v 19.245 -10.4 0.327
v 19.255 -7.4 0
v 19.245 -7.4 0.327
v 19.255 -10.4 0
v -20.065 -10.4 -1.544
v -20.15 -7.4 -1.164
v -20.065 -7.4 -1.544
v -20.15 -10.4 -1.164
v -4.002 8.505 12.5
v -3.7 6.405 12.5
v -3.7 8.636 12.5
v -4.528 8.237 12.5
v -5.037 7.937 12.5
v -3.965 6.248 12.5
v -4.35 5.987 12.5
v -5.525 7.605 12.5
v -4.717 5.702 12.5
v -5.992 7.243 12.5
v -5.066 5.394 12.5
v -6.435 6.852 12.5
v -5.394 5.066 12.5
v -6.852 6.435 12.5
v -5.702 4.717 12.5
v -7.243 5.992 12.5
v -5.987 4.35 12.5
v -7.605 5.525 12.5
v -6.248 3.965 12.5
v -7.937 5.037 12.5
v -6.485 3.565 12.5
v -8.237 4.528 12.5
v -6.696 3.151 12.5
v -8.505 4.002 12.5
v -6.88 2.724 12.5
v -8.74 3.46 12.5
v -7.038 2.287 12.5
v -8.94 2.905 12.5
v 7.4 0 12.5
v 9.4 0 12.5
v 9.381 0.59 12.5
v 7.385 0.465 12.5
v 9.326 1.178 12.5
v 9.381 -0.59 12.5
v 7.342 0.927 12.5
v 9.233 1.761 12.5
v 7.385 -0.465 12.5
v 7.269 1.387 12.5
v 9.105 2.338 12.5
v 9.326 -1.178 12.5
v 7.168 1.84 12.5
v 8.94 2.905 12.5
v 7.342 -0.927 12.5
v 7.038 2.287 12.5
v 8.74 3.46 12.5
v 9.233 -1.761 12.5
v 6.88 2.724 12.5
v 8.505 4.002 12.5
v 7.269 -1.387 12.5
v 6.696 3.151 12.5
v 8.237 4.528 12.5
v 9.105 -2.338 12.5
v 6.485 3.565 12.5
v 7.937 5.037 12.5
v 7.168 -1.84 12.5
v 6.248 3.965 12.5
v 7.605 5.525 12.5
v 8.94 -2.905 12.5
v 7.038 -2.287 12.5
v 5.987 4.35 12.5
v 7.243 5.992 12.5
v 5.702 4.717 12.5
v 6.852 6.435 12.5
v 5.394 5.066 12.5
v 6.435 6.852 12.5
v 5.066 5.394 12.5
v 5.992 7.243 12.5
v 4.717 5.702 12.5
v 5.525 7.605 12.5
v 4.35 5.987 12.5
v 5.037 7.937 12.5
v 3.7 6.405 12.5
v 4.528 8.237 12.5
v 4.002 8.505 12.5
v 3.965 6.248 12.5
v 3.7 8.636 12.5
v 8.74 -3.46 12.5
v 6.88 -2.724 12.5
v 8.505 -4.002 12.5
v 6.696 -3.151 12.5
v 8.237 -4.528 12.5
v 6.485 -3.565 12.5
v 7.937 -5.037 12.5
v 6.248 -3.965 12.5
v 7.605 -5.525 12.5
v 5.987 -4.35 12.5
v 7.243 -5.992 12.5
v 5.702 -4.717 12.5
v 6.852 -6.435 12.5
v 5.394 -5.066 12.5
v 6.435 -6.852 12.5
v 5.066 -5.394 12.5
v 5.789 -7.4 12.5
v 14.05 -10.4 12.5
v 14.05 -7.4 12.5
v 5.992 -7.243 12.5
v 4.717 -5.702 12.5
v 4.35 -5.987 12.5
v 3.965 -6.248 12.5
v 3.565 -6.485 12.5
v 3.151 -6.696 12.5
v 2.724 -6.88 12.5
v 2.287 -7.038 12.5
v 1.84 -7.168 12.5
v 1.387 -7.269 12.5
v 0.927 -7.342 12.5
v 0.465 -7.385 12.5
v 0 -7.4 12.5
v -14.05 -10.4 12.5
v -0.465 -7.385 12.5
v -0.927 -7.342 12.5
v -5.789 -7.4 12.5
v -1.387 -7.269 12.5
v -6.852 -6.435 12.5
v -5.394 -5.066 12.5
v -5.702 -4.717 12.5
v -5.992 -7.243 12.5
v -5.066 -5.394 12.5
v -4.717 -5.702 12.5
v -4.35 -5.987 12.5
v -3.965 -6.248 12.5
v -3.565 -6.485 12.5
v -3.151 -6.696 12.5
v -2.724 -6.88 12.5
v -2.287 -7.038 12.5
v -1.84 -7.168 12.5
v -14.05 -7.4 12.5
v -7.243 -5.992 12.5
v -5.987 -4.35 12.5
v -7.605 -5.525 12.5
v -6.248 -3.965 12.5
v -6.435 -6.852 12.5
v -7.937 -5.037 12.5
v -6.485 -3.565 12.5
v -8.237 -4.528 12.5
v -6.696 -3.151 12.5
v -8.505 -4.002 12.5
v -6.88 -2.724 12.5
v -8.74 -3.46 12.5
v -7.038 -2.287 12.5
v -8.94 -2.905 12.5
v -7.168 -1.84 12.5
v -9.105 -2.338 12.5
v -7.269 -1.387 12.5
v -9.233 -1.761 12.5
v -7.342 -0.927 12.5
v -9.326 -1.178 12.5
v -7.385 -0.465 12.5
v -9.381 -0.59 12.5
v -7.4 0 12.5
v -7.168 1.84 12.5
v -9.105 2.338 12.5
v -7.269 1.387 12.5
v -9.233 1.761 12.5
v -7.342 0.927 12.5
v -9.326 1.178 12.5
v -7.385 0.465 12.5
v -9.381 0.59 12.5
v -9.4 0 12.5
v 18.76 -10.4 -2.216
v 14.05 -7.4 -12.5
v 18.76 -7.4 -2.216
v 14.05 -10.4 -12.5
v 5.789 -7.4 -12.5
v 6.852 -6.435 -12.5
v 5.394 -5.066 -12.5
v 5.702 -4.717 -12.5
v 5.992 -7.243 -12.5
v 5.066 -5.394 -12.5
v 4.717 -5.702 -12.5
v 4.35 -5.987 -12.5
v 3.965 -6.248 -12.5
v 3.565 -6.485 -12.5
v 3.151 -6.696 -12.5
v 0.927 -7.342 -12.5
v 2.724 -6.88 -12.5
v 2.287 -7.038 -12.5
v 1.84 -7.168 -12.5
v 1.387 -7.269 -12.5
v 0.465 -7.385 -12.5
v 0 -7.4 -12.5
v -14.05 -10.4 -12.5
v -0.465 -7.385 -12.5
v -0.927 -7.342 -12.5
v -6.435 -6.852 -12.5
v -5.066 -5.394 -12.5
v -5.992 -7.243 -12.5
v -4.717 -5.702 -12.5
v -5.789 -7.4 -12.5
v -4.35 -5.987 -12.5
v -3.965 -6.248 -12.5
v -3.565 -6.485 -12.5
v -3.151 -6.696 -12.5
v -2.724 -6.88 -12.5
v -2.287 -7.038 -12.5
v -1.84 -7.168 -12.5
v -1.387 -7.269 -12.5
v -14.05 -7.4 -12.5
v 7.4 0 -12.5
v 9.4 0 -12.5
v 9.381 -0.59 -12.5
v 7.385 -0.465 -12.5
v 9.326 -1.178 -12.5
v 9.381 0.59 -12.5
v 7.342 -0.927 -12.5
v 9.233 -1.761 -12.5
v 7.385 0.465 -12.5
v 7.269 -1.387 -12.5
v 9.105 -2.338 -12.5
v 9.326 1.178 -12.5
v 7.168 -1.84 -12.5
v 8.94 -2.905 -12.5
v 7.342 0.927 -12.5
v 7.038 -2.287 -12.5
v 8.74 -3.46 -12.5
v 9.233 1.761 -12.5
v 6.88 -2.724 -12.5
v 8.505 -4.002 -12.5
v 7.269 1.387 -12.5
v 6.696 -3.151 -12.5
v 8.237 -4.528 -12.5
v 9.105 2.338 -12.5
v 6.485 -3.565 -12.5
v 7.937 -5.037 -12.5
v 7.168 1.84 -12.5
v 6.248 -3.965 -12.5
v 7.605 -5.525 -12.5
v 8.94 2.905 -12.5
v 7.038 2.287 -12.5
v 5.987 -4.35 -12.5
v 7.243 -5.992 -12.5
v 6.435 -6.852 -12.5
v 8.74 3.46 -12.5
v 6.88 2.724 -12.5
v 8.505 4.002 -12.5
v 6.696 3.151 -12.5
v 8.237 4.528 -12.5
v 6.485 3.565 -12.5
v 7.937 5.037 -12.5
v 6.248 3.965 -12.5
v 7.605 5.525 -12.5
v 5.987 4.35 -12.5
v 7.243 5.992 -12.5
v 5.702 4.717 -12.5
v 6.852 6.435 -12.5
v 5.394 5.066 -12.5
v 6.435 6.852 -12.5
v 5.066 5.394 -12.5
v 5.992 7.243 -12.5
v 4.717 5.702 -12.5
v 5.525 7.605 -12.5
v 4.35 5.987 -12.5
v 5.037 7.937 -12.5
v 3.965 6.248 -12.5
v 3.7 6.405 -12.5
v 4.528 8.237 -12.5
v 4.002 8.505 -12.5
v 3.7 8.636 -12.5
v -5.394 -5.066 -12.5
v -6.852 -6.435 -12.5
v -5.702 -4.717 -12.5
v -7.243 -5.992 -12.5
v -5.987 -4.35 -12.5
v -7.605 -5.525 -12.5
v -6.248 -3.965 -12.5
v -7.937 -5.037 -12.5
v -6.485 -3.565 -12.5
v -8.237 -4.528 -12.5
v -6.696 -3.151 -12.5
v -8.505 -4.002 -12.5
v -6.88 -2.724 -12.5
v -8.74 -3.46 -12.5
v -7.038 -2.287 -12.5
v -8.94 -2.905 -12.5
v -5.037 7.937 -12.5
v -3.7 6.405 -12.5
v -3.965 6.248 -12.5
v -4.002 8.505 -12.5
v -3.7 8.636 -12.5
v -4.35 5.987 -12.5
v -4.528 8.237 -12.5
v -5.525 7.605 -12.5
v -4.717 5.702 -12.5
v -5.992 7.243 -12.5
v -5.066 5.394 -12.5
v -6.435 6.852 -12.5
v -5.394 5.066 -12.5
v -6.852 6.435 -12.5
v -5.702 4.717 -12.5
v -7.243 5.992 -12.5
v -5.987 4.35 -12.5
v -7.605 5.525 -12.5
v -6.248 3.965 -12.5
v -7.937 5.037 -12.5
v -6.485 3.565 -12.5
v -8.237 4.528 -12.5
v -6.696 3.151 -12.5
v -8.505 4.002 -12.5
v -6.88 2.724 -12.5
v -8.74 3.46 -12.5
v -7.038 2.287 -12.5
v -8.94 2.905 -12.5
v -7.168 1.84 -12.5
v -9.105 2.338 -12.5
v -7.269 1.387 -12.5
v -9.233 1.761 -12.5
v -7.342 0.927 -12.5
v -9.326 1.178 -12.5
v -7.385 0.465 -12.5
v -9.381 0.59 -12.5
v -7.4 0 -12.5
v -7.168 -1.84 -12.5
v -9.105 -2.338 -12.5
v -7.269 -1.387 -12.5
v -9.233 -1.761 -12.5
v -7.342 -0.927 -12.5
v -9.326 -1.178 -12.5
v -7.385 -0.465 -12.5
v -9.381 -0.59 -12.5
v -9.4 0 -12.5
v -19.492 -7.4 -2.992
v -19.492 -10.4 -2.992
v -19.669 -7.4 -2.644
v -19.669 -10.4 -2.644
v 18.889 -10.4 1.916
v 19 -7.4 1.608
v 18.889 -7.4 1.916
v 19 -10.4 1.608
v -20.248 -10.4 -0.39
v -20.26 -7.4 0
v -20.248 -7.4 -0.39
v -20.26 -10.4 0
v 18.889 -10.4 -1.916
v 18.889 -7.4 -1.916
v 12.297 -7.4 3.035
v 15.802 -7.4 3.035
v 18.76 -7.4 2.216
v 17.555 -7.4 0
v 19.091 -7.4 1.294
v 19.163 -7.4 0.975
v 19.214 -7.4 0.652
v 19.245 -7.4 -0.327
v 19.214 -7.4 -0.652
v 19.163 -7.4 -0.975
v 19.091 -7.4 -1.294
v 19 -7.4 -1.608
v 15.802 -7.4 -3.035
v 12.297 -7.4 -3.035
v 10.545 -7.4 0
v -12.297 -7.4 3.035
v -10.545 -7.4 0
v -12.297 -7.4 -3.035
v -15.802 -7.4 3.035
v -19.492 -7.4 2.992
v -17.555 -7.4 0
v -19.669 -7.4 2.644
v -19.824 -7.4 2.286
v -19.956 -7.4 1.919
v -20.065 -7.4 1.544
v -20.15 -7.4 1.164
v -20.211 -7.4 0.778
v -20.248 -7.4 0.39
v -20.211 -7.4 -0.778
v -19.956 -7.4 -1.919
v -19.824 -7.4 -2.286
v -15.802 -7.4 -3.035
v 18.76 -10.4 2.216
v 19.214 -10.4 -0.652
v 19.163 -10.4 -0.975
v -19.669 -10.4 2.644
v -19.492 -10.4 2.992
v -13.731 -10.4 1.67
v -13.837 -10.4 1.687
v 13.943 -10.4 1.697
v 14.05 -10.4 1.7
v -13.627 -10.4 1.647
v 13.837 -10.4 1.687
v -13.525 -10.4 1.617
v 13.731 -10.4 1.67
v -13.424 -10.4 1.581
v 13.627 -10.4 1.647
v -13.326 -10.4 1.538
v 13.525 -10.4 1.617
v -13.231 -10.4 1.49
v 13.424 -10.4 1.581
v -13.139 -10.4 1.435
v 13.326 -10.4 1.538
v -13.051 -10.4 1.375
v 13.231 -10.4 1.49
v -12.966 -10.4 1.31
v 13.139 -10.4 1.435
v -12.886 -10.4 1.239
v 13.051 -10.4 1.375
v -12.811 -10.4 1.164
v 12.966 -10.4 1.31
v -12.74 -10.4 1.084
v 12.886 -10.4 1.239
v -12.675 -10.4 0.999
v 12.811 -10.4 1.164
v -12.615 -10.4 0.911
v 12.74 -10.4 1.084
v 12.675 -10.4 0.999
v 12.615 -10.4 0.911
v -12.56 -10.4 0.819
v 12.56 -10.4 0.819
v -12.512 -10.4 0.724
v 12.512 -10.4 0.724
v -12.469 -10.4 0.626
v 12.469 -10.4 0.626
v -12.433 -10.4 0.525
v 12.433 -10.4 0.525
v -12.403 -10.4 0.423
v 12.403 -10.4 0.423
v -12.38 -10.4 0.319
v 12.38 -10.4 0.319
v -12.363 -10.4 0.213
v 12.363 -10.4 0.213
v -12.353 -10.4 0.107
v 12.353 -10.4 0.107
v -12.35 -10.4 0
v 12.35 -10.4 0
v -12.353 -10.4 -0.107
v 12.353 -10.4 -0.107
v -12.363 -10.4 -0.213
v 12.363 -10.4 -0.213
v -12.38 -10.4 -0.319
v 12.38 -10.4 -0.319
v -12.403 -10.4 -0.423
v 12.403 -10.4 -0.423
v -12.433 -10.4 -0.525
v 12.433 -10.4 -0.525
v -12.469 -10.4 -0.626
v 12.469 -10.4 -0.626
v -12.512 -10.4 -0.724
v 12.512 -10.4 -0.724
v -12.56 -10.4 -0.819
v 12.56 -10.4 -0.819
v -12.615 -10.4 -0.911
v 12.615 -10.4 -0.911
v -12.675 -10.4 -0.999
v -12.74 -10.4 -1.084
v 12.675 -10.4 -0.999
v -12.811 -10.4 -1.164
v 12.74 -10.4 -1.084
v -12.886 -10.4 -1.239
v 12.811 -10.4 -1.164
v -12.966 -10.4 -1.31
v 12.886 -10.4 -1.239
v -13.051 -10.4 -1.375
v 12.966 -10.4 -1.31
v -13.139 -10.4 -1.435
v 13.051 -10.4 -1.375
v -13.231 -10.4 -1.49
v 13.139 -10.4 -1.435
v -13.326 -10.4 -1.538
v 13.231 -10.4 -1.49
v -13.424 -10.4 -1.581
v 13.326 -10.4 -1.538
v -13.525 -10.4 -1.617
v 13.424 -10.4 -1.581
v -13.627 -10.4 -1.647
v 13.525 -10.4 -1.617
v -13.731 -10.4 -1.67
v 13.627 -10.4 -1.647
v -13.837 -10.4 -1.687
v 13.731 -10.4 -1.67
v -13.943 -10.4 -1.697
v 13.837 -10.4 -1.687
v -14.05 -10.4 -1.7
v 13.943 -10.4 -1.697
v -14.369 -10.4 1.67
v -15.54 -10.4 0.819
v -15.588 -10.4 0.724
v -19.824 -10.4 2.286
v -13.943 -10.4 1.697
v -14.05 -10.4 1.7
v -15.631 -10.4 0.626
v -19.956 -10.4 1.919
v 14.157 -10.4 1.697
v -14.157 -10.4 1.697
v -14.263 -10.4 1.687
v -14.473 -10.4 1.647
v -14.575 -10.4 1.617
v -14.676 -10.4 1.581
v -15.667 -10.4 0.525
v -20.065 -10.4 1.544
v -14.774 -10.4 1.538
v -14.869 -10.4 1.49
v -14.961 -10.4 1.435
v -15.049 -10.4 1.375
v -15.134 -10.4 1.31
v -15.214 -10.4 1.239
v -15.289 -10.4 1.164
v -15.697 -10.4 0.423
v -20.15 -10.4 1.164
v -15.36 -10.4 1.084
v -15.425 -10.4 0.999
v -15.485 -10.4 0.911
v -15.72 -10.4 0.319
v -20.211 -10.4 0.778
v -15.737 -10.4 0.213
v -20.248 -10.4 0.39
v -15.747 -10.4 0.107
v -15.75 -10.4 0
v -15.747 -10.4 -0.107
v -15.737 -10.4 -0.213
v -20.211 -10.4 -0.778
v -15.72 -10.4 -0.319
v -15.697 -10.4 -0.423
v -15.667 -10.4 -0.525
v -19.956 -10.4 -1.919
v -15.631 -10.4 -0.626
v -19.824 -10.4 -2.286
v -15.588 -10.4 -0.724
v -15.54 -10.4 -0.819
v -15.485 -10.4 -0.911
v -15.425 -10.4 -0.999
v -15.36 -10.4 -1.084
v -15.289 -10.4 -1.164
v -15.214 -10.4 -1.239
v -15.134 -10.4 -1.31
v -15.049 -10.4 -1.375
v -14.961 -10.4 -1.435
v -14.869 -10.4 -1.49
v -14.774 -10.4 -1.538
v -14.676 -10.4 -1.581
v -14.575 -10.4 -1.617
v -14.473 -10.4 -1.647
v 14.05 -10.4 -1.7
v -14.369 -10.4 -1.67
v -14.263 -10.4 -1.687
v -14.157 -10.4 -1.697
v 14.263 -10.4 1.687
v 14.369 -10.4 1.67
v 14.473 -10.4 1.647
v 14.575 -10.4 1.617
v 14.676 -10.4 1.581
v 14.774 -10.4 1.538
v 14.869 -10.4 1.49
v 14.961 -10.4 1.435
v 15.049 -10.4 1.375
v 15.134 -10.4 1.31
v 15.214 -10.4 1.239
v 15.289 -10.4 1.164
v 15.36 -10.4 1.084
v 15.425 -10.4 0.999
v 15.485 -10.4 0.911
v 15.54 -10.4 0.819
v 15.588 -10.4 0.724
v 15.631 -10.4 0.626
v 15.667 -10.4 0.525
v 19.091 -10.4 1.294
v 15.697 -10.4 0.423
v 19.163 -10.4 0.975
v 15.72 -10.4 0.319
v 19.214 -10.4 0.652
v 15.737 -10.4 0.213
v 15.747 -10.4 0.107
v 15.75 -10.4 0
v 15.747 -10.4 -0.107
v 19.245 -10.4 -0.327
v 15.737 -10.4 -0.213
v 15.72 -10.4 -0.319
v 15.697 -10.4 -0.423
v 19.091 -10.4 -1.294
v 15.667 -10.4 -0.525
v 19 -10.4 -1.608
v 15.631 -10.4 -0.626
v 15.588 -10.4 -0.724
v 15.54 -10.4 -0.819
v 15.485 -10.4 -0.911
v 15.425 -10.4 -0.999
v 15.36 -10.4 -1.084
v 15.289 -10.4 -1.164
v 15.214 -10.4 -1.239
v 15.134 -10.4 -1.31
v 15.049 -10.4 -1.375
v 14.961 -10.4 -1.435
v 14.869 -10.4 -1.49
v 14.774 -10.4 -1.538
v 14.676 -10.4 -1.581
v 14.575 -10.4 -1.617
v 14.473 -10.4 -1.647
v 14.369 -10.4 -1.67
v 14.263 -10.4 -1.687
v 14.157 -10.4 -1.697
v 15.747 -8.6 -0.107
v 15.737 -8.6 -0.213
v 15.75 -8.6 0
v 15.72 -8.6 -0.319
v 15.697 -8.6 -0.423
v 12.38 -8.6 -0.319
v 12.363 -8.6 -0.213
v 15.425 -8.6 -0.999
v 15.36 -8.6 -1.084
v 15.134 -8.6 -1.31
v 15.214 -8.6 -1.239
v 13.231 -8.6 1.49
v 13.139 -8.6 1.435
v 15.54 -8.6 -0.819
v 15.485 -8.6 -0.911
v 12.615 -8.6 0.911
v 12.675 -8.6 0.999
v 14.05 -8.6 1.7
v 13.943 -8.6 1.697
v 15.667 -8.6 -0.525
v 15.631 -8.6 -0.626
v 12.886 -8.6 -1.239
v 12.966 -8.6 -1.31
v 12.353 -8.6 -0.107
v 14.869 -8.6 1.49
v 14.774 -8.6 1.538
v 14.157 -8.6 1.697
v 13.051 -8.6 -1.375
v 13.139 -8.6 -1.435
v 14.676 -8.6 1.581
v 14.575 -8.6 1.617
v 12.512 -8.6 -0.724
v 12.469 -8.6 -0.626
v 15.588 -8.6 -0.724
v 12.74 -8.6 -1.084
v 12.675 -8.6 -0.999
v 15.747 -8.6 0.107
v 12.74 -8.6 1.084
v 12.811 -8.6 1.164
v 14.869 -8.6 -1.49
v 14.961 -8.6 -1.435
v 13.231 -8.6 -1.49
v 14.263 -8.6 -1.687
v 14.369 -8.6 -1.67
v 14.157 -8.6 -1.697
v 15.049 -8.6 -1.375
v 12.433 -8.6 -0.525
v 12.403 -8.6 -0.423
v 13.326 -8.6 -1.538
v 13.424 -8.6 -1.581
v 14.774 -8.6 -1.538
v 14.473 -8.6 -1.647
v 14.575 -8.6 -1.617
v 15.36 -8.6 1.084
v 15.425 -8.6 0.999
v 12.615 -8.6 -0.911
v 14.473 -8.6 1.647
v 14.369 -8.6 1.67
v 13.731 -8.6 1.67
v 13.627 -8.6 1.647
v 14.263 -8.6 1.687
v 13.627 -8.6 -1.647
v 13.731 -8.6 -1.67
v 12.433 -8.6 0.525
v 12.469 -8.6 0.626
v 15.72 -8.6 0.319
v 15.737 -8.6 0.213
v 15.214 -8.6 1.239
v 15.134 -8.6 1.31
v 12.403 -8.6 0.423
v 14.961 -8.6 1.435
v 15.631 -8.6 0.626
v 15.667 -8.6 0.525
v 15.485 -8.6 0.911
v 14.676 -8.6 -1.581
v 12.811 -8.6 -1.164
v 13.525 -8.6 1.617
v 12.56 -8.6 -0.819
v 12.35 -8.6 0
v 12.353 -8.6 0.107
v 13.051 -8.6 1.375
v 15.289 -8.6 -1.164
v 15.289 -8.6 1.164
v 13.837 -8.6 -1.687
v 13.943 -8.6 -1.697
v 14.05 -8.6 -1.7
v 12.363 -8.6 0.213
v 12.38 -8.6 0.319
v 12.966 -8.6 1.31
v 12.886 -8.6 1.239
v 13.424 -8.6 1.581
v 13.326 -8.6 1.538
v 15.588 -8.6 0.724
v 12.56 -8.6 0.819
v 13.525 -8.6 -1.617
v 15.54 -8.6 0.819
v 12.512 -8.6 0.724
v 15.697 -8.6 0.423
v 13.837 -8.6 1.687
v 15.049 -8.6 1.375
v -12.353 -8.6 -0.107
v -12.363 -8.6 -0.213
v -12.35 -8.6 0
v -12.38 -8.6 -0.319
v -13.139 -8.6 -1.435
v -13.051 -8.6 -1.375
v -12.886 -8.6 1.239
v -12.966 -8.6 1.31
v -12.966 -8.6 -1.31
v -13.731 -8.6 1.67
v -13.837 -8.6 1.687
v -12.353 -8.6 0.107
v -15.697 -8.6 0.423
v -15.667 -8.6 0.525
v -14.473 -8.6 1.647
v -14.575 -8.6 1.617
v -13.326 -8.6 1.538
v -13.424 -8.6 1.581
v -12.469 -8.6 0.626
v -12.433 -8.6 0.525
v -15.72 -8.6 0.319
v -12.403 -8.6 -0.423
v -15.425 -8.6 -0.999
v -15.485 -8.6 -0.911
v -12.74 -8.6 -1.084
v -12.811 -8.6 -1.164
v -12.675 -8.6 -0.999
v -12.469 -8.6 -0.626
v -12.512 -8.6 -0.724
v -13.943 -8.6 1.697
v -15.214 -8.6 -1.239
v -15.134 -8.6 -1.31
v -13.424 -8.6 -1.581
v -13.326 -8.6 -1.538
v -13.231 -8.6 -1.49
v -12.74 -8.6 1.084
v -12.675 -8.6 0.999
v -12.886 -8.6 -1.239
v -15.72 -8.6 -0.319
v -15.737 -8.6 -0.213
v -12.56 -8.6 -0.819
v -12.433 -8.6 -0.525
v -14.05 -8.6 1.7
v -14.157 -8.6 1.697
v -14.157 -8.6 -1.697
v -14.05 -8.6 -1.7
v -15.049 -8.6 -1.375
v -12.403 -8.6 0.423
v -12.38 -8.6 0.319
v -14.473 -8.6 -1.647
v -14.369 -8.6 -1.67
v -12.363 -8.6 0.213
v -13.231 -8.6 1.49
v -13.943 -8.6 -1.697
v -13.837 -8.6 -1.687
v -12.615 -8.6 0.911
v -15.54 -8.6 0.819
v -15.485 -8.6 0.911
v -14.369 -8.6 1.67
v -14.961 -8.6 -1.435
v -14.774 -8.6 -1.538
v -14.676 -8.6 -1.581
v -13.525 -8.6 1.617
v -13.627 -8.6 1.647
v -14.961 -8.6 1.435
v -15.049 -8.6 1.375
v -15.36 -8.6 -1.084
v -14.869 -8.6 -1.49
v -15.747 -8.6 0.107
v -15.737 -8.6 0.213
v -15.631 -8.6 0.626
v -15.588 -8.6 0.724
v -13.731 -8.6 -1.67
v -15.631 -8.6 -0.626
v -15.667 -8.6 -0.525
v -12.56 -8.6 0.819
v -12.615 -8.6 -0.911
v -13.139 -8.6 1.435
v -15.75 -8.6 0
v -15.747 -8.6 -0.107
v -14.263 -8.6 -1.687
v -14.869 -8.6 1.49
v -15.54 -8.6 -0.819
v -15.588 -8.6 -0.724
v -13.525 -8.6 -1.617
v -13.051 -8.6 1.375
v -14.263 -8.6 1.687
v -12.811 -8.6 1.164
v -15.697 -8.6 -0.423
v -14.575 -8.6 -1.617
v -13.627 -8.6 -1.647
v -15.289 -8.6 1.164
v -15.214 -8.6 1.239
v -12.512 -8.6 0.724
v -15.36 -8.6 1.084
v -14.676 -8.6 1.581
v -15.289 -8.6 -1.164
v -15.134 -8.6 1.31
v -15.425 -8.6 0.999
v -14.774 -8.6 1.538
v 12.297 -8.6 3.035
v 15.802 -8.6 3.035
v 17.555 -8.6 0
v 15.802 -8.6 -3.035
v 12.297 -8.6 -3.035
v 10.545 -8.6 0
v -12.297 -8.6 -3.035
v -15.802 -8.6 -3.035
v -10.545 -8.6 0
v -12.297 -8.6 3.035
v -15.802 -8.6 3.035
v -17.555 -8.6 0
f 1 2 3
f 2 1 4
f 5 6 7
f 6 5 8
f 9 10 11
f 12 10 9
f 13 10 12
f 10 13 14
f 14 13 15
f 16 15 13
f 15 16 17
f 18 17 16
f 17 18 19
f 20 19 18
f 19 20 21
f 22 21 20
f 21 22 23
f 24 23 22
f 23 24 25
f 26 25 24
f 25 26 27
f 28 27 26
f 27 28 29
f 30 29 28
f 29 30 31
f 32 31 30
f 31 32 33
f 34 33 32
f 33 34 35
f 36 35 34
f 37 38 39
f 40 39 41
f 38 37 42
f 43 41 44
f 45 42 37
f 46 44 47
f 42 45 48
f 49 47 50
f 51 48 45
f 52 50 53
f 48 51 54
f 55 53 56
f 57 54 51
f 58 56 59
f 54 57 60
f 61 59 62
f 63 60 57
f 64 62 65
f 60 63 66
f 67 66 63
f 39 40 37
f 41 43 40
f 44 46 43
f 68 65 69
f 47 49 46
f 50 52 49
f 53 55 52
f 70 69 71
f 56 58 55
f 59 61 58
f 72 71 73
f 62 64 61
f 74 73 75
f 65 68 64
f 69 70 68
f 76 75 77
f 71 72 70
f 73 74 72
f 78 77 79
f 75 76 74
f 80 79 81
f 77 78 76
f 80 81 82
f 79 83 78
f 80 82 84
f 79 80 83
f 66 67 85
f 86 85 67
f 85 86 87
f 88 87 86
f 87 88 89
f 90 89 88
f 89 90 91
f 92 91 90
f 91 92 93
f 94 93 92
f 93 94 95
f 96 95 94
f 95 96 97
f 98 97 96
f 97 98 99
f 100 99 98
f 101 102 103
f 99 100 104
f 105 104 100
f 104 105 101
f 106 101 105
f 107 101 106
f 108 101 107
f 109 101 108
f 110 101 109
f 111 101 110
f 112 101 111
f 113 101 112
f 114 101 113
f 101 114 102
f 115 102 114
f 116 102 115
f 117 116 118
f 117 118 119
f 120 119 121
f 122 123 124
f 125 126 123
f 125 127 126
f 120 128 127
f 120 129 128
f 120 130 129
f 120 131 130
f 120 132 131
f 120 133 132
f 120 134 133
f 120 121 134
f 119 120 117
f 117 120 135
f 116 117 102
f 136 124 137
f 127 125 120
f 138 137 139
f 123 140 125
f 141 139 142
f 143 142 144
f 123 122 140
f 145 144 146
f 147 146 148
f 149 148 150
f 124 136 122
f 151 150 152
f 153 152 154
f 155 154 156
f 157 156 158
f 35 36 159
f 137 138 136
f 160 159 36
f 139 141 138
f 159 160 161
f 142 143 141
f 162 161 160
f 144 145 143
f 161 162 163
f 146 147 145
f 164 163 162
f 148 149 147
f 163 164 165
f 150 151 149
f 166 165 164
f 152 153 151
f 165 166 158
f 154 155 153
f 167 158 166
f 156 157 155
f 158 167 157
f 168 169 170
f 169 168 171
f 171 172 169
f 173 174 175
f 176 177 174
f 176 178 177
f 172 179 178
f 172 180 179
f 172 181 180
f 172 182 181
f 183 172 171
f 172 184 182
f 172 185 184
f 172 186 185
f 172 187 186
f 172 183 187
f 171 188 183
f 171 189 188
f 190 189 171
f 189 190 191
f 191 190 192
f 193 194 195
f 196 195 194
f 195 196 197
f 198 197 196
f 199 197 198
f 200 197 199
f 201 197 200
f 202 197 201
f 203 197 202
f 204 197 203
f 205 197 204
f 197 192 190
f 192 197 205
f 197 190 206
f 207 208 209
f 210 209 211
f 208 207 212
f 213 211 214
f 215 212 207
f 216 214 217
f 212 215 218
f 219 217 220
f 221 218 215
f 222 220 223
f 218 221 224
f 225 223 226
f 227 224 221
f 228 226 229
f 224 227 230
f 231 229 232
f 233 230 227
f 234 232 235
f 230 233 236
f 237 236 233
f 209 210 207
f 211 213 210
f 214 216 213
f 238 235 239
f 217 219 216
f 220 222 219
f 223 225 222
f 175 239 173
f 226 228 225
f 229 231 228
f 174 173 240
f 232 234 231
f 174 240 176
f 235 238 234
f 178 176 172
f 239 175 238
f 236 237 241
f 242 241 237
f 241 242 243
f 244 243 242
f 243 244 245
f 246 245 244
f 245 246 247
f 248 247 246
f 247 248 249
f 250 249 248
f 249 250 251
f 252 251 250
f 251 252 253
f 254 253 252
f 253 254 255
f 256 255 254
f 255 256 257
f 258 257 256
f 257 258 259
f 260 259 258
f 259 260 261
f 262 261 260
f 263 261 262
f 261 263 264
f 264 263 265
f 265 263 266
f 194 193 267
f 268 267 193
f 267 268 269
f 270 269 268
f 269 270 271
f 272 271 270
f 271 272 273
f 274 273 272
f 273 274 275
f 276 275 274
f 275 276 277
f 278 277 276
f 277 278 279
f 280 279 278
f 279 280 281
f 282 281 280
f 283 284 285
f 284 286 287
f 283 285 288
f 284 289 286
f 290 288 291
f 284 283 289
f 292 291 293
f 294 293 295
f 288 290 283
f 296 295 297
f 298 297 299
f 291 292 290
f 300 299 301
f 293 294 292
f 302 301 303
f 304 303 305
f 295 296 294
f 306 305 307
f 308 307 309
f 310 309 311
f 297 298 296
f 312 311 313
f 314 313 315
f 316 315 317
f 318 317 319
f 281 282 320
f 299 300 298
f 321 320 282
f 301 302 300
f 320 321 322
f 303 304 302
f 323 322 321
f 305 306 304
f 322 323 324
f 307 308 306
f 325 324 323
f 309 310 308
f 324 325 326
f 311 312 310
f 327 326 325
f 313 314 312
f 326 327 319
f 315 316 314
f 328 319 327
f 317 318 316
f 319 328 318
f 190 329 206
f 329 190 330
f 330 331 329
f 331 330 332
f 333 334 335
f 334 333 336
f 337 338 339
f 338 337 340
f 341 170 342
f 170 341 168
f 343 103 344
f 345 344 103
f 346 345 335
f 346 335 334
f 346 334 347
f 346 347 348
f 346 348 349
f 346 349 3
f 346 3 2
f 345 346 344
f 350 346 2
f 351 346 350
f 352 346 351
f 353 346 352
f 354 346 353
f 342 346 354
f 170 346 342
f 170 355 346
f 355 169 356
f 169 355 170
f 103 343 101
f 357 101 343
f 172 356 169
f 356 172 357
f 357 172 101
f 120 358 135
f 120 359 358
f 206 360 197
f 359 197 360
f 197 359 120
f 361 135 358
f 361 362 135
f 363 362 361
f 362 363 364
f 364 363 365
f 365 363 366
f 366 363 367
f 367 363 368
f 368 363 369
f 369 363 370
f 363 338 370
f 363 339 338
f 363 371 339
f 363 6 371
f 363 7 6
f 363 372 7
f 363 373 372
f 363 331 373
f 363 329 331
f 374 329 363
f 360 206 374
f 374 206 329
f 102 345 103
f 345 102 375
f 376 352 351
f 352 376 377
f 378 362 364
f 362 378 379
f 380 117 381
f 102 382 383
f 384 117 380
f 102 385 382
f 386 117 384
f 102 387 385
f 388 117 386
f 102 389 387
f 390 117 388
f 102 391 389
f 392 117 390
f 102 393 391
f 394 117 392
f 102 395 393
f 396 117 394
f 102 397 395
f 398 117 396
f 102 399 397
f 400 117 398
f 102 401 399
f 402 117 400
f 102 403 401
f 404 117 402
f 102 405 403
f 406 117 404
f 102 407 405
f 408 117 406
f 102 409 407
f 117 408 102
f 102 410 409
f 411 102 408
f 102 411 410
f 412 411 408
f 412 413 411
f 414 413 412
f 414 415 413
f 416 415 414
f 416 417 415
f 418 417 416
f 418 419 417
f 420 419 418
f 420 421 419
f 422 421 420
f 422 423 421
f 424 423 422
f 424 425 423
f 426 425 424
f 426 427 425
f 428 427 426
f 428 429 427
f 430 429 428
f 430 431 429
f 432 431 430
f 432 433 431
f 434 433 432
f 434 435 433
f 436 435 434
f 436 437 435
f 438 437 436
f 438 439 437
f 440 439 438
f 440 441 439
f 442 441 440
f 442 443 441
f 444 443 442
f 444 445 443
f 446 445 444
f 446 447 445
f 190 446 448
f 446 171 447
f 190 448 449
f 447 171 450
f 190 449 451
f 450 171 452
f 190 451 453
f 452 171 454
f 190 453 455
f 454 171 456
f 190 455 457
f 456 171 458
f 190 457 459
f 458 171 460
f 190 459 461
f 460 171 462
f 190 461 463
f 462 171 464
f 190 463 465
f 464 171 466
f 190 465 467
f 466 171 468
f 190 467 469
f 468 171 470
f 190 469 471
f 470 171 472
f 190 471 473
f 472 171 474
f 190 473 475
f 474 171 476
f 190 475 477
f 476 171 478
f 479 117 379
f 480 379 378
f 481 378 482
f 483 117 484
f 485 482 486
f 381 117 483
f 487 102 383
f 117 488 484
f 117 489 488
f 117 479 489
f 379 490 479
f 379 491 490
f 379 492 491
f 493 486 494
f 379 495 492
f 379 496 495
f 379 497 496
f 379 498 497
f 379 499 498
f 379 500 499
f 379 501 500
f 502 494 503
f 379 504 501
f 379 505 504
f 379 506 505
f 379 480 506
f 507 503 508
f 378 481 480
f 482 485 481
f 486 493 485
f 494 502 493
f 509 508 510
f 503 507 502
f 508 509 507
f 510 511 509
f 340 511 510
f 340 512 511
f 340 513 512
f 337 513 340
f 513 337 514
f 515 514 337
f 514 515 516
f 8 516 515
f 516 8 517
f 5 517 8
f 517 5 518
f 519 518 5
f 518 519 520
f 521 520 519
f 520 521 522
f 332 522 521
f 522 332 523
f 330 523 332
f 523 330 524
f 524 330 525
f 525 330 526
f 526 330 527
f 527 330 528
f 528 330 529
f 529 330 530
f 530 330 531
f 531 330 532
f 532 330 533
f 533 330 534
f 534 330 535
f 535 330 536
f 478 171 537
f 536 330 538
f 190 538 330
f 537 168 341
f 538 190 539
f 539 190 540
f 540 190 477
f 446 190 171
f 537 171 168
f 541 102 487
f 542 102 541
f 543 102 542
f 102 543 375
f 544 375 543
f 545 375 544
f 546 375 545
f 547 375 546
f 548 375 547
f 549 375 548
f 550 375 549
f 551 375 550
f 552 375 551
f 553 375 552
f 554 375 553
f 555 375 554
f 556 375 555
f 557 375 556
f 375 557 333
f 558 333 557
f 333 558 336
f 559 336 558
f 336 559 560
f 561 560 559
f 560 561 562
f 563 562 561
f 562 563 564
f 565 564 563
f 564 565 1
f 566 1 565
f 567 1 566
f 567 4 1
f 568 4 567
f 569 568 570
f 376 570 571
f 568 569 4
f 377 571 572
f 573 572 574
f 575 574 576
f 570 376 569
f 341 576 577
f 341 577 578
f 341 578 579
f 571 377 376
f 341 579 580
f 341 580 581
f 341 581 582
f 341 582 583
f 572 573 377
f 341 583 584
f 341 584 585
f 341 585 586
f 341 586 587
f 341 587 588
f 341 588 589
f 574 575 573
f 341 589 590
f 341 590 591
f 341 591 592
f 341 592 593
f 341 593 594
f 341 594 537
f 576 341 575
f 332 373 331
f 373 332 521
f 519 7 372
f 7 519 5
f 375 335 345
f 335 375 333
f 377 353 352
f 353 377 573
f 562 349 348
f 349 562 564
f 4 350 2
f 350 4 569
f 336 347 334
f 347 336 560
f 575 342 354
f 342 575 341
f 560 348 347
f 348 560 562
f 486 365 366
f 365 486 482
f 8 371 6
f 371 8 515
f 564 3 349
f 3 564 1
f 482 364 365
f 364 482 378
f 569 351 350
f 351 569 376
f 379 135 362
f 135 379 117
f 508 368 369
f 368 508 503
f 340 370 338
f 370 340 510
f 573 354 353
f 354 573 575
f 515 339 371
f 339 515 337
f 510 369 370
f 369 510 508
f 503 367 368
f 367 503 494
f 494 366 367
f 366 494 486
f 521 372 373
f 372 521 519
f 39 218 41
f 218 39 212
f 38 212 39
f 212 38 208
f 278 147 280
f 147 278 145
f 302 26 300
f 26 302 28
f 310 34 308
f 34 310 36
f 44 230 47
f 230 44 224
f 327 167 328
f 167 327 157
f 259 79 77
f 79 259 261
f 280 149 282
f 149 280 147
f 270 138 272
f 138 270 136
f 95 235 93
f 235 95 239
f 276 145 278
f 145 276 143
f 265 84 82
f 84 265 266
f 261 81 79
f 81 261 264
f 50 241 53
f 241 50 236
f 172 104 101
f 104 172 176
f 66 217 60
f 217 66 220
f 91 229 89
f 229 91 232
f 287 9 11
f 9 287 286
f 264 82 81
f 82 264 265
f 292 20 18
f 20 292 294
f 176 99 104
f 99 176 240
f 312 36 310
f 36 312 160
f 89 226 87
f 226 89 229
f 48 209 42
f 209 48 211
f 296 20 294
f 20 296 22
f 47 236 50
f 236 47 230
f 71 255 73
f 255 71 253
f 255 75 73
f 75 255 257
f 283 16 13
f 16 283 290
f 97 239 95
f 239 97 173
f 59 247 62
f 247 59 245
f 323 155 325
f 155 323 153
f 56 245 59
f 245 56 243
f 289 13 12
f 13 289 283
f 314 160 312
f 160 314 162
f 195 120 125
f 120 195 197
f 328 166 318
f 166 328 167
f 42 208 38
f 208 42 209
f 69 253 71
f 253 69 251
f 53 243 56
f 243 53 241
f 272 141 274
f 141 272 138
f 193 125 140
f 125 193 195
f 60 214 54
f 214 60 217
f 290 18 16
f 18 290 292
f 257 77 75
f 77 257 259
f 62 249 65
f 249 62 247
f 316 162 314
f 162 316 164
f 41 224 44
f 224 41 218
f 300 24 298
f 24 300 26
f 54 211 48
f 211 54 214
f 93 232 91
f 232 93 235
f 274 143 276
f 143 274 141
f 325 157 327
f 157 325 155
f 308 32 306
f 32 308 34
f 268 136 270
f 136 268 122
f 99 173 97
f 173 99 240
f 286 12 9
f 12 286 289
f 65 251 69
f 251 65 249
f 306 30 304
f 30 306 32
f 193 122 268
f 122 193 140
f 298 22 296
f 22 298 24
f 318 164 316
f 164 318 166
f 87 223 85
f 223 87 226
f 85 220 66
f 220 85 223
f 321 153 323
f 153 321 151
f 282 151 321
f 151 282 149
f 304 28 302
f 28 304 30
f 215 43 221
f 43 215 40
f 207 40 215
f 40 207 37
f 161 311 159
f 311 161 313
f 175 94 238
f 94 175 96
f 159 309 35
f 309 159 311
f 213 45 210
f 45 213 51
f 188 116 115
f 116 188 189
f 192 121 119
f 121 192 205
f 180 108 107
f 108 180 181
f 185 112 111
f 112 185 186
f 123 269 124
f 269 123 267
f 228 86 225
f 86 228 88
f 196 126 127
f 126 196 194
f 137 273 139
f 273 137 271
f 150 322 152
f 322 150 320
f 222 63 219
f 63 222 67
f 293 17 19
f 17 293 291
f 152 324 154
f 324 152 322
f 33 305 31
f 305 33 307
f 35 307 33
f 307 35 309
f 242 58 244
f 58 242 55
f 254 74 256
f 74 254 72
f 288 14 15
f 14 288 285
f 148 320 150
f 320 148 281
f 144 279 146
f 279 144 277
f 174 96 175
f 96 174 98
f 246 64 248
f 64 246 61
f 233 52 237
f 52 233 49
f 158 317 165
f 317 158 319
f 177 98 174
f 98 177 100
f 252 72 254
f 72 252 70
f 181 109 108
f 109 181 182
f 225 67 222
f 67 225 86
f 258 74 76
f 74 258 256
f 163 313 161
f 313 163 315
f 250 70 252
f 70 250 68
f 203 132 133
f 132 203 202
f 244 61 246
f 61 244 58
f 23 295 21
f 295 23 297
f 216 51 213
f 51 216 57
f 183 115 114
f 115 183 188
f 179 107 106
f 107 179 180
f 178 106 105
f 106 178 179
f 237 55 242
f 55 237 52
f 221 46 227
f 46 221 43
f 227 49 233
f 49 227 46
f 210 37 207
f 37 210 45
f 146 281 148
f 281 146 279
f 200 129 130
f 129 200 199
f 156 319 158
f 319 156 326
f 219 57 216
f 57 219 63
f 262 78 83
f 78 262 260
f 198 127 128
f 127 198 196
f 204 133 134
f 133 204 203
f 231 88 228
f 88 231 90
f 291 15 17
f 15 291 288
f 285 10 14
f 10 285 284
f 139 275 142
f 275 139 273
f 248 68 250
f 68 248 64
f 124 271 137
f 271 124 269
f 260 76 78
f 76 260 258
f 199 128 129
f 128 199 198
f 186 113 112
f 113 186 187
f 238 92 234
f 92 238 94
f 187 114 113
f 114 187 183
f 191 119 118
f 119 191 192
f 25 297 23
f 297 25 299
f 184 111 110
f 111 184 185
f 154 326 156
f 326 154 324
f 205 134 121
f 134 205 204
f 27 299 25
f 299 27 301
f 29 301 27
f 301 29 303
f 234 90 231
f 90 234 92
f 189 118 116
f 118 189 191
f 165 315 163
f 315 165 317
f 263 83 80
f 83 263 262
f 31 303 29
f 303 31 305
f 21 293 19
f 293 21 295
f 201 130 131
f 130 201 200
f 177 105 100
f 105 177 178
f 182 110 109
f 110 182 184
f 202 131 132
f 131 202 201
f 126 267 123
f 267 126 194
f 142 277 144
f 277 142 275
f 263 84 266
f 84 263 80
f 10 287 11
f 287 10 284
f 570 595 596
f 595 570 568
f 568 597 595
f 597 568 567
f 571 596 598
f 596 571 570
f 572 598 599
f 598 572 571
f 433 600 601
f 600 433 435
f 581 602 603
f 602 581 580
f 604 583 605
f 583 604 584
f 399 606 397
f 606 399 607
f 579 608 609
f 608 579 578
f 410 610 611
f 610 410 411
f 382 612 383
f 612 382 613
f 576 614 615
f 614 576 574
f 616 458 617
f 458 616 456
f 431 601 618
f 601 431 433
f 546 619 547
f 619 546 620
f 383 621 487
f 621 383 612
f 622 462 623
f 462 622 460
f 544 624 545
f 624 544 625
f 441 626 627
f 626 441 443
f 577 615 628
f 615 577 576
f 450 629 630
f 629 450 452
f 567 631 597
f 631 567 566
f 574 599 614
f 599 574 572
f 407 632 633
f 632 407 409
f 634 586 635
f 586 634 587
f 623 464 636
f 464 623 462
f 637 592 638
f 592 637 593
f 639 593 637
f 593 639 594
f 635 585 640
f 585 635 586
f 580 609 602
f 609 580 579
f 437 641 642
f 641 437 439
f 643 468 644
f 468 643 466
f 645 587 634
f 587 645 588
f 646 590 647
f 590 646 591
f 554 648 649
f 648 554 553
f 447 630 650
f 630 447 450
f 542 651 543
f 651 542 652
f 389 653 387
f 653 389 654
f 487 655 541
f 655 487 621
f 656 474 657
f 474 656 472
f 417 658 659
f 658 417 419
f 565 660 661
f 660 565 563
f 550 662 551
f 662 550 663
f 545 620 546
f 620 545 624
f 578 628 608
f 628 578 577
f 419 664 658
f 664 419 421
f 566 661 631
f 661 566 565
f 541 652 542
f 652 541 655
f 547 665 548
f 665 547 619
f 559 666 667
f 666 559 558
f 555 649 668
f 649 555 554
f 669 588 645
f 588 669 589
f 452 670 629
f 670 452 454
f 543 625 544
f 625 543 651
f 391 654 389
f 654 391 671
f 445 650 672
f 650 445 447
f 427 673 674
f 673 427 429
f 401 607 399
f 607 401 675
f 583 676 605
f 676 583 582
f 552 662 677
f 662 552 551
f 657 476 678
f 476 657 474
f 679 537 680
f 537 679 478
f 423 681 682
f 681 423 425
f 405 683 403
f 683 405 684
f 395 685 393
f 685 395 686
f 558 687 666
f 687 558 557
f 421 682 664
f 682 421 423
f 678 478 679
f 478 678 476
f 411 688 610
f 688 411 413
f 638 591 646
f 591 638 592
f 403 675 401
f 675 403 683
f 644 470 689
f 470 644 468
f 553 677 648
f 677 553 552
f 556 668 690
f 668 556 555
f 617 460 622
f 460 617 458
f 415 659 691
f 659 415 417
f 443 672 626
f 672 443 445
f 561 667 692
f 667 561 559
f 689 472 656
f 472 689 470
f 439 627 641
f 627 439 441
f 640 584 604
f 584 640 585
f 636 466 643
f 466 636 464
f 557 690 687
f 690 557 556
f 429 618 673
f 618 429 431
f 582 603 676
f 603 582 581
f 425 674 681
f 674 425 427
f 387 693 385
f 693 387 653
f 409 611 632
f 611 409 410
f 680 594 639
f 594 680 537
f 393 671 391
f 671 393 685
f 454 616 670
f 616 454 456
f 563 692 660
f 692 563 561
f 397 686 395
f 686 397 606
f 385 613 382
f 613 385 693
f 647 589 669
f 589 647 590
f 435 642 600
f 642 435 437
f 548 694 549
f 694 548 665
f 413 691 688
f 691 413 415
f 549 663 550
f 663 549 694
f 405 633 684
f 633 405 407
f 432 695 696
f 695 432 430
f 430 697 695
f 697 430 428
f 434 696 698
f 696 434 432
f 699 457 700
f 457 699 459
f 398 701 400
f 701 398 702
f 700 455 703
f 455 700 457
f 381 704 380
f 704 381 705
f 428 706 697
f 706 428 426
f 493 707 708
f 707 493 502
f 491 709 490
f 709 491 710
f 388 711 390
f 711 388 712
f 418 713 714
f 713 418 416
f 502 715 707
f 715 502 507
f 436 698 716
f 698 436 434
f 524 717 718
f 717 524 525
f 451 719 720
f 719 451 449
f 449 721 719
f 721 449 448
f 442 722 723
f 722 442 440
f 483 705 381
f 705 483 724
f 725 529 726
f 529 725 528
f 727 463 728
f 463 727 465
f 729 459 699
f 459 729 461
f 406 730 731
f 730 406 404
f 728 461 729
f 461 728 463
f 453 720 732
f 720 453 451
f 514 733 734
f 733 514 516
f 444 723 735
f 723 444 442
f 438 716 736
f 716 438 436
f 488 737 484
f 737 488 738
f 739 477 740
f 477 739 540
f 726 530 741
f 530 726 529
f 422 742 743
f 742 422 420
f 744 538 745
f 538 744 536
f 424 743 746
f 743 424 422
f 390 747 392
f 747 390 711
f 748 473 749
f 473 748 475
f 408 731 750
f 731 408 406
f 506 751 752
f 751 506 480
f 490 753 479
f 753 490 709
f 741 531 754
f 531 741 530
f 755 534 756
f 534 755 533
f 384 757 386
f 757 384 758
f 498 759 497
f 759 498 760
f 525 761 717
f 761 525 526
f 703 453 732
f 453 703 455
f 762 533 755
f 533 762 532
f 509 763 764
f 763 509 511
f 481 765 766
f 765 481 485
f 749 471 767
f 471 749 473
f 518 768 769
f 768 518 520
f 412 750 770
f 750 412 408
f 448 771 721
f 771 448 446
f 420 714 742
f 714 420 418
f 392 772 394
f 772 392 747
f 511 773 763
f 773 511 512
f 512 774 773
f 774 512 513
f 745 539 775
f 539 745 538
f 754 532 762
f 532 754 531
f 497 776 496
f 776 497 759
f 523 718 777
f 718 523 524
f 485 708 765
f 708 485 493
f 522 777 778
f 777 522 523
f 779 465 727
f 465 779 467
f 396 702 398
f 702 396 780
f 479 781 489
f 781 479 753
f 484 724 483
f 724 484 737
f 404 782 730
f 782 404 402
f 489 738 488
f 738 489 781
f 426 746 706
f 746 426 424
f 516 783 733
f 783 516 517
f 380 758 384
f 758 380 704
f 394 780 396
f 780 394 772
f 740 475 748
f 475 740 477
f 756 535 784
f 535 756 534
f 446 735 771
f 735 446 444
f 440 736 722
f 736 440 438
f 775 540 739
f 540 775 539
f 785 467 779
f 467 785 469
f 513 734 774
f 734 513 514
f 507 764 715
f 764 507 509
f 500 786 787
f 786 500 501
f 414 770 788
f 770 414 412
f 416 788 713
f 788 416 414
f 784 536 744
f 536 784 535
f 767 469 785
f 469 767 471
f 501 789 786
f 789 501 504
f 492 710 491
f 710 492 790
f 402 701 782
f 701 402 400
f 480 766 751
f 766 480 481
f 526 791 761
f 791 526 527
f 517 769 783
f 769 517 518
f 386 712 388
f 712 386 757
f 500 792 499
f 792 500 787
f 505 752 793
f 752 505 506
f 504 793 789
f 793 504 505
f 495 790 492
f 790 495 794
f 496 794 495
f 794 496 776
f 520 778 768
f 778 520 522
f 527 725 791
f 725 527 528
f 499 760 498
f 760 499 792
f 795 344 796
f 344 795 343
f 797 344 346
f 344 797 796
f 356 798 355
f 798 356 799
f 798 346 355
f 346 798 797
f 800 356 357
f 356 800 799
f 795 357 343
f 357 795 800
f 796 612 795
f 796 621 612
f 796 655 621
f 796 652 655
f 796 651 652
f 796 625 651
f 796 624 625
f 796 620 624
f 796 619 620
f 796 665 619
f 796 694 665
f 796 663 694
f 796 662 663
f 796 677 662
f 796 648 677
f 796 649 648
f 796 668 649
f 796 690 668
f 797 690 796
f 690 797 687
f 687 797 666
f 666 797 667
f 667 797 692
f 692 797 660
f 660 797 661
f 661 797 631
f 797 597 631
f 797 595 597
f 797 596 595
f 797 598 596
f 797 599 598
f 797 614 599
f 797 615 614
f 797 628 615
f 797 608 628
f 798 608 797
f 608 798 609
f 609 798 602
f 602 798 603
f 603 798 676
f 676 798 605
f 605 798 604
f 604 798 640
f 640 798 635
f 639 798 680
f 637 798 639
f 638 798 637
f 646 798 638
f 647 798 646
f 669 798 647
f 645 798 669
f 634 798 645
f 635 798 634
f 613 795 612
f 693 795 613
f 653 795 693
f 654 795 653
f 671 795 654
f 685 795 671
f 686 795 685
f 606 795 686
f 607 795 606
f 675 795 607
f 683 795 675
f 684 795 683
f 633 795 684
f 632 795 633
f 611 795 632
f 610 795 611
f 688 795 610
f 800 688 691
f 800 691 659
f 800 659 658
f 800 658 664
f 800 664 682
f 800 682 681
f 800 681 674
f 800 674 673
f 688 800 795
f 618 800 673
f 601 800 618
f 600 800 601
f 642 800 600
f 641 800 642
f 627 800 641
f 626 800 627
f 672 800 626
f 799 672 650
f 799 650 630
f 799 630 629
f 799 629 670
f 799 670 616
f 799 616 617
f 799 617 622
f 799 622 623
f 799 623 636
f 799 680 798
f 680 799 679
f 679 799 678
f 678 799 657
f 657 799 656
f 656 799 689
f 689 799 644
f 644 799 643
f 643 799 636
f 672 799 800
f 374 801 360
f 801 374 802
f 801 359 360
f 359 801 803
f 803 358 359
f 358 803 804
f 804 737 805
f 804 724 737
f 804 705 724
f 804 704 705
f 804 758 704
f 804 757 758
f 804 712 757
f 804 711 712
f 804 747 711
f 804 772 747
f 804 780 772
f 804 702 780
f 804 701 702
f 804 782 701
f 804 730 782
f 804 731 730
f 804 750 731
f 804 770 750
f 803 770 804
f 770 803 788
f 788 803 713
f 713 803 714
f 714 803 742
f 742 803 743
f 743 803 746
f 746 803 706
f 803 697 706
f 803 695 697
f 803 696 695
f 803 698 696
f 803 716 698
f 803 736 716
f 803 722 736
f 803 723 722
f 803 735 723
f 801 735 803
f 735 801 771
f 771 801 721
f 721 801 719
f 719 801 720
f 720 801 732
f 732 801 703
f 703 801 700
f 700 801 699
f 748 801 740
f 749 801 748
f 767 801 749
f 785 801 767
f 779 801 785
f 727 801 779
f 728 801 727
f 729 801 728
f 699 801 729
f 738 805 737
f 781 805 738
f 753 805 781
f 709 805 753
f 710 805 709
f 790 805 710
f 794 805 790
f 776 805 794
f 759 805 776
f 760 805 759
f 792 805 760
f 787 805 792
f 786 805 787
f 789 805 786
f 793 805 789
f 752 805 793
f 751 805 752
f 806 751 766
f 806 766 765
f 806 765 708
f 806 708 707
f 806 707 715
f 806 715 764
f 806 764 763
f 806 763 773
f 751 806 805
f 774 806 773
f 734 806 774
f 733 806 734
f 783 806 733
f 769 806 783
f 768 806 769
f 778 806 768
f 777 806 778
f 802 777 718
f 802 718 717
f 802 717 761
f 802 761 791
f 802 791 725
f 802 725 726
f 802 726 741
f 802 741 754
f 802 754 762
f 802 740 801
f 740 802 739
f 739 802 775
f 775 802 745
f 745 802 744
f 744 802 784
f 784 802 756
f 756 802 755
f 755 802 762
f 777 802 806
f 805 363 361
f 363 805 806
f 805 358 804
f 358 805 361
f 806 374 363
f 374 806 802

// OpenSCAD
difference() {
  difference() {
    difference() {
      difference() {
        difference() {
          difference() {
            union() {
              hull() {
                translate(v=[0.000, -8.900, 0.000]) {
                rotate([-180.000,-180.000,-180.000]){
                  cube(size=[28.100, 3.000, 25.000], center=true);
                } // End rotate
                } // End translate
                translate(v=[14.050, -8.900, 0.000]) {
                rotate([-90.000,-180.000,-180.000]){
                  cylinder(h=3.000, r1=5.205, r2=5.205, $fn=100, center=true);
                } // End rotate
                } // End translate
                translate(v=[-14.050, -8.900, 0.000]) {
                rotate([-90.000,-180.000,-180.000]){
                  cylinder(h=3.000, r1=6.210, r2=6.210, $fn=100, center=true);
                } // End rotate
                } // End translate
              } // End hull
              cylinder(h=25.000, r1=9.400, r2=9.400, $fn=100, center=true);
            } // End union
            cylinder(h=26.000, r1=7.400, r2=7.400, $fn=100, center=true);
          } // End difference
          translate(v=[0.000, 8.400, 0.000]) {
          rotate([-180.000,-180.000,-180.000]){
            cube(size=[7.400, 22.000, 26.000], center=true);
          } // End rotate
          } // End translate
        } // End difference
        translate(v=[14.050, -7.400, 0.000]) {
        rotate([90.000,-180.000,-180.000]){
          cylinder(h=7.000, r1=1.700, r2=1.700, $fn=100, center=true);
        } // End rotate
        } // End translate
      } // End difference
      translate(v=[-14.050, -7.400, 0.000]) {
      rotate([90.000,-180.000,-180.000]){
        cylinder(h=7.000, r1=1.700, r2=1.700, $fn=100, center=true);
      } // End rotate
      } // End translate
    } // End difference
    translate(v=[14.050, -7.400, 0.000]) {
    rotate([90.000,-180.000,-180.000]){
      cylinder(h=2.400, r1=3.505, r2=3.505, $fn=6, center=true);
    } // End rotate
    } // End translate
  } // End difference
  translate(v=[-14.050, -7.400, 0.000]) {
  rotate([90.000,-180.000,-180.000]){
    cylinder(h=2.400, r1=3.505, r2=3.505, $fn=6, center=true);
  } // End rotate
  } // End translate
} // End difference
